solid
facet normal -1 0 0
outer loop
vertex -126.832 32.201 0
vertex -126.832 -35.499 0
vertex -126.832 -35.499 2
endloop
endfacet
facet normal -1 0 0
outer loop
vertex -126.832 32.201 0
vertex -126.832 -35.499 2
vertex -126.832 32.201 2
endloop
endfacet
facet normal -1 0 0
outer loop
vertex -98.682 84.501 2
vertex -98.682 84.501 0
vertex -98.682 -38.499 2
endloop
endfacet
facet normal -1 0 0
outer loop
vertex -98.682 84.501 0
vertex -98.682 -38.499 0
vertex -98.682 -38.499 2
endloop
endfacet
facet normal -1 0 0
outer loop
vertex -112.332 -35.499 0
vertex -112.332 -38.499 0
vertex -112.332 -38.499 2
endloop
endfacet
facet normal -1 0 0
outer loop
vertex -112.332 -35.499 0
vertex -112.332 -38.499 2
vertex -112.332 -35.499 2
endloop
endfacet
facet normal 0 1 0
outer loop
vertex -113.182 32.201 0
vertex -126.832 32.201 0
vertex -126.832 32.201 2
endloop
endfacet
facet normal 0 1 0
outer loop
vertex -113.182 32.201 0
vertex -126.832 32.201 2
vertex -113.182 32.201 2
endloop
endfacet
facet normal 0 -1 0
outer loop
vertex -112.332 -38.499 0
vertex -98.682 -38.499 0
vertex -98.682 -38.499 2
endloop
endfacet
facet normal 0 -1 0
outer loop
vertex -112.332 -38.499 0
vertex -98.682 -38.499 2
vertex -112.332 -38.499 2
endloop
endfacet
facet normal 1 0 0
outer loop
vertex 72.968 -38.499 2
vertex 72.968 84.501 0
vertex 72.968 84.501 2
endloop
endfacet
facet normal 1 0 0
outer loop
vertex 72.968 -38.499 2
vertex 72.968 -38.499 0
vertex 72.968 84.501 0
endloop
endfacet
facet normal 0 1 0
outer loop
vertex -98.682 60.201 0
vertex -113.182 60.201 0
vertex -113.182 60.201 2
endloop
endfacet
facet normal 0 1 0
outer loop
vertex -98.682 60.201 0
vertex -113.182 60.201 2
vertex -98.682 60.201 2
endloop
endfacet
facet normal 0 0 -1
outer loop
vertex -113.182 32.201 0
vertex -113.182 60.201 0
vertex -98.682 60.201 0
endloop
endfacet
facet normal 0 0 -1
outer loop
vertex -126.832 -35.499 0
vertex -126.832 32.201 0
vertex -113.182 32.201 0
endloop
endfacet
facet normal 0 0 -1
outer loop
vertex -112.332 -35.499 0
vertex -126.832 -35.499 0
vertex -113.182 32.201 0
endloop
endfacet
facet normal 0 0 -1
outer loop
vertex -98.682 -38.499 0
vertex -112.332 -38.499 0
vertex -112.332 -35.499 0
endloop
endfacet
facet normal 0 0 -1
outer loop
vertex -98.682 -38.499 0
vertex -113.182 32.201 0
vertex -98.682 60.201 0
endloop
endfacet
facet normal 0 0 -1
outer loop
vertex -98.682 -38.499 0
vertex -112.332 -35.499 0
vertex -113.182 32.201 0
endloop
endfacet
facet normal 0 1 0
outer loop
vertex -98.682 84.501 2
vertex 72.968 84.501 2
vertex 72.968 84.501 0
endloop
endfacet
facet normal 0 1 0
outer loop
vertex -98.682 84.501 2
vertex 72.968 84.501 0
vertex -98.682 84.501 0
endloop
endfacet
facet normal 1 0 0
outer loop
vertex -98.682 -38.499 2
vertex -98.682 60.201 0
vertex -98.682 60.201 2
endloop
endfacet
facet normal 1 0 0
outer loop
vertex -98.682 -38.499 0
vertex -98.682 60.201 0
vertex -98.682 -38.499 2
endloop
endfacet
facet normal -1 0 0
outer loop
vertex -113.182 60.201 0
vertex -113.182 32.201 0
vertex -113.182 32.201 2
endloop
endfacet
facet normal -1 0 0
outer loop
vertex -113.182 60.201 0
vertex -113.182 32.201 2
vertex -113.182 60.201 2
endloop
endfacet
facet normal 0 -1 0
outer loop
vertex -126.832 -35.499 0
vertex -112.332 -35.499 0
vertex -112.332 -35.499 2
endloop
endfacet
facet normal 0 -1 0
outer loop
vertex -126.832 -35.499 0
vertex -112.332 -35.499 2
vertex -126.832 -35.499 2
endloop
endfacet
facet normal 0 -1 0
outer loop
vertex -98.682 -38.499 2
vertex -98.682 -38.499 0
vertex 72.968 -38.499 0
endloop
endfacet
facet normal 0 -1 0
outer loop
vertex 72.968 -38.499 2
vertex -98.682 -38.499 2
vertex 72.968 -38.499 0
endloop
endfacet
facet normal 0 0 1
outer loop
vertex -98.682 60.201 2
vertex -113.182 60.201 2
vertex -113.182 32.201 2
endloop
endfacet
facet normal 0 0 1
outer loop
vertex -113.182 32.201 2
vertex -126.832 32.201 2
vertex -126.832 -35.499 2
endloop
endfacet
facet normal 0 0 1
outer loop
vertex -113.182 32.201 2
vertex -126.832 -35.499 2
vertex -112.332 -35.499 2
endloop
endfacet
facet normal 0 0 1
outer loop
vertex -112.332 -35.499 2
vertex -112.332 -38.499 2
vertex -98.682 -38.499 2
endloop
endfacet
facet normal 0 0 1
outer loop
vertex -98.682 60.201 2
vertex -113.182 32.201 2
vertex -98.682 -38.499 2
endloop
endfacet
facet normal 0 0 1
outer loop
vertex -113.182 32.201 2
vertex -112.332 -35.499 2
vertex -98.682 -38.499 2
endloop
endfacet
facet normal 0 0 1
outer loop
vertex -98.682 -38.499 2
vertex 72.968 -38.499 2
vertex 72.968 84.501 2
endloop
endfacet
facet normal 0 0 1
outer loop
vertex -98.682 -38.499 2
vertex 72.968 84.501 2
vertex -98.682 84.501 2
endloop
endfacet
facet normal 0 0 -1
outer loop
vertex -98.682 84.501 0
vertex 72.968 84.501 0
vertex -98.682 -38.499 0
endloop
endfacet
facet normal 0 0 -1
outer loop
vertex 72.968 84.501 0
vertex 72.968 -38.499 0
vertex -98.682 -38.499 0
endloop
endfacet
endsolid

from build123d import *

# Parameters (mm, degrees)
F0_W      = 171.65
F0_H      = 100
F1_DEPTH  = 2
F1_FACE_W = 171.65
F1_FACE_H = 2
F2_DEPTH  = 23
F4_DEPTH  = 2


with BuildPart() as f1:
    # F0 (on Top) → F1 (new body)
    with BuildSketch(Plane.XY):
        with Locations((-12.856778, 11.501423)):
            Rectangle(F0_W, F0_H)
    extrude(amount=F1_DEPTH)

    # F1_face (on face) → F2 (join)
    with BuildSketch(Plane(origin=(-12.856778, 61.501423, 1), x_dir=(-1, 0, 0), z_dir=(0, 1, 0))):
        Rectangle(F1_FACE_W, F1_FACE_H)
    extrude(amount=F2_DEPTH)


with BuildPart() as f4:
    # F3 (on face) → F4 (new body)
    with BuildSketch(Plane(origin=(0, 0, 0), x_dir=(1, 0, 0), z_dir=(0, 0, -1))):
        Polygon((-98.681778, -60.201423), (-98.681778, 38.498577), (-112.331778, 38.498577), (-112.331778, 35.498577), (-126.831778, 35.498577), (-126.831778, -32.201423), (-113.181778, -32.201423), (-113.181778, -60.201423), align=None)
    extrude(amount=-F4_DEPTH)


solid = Compound([f1.part, f4.part])
